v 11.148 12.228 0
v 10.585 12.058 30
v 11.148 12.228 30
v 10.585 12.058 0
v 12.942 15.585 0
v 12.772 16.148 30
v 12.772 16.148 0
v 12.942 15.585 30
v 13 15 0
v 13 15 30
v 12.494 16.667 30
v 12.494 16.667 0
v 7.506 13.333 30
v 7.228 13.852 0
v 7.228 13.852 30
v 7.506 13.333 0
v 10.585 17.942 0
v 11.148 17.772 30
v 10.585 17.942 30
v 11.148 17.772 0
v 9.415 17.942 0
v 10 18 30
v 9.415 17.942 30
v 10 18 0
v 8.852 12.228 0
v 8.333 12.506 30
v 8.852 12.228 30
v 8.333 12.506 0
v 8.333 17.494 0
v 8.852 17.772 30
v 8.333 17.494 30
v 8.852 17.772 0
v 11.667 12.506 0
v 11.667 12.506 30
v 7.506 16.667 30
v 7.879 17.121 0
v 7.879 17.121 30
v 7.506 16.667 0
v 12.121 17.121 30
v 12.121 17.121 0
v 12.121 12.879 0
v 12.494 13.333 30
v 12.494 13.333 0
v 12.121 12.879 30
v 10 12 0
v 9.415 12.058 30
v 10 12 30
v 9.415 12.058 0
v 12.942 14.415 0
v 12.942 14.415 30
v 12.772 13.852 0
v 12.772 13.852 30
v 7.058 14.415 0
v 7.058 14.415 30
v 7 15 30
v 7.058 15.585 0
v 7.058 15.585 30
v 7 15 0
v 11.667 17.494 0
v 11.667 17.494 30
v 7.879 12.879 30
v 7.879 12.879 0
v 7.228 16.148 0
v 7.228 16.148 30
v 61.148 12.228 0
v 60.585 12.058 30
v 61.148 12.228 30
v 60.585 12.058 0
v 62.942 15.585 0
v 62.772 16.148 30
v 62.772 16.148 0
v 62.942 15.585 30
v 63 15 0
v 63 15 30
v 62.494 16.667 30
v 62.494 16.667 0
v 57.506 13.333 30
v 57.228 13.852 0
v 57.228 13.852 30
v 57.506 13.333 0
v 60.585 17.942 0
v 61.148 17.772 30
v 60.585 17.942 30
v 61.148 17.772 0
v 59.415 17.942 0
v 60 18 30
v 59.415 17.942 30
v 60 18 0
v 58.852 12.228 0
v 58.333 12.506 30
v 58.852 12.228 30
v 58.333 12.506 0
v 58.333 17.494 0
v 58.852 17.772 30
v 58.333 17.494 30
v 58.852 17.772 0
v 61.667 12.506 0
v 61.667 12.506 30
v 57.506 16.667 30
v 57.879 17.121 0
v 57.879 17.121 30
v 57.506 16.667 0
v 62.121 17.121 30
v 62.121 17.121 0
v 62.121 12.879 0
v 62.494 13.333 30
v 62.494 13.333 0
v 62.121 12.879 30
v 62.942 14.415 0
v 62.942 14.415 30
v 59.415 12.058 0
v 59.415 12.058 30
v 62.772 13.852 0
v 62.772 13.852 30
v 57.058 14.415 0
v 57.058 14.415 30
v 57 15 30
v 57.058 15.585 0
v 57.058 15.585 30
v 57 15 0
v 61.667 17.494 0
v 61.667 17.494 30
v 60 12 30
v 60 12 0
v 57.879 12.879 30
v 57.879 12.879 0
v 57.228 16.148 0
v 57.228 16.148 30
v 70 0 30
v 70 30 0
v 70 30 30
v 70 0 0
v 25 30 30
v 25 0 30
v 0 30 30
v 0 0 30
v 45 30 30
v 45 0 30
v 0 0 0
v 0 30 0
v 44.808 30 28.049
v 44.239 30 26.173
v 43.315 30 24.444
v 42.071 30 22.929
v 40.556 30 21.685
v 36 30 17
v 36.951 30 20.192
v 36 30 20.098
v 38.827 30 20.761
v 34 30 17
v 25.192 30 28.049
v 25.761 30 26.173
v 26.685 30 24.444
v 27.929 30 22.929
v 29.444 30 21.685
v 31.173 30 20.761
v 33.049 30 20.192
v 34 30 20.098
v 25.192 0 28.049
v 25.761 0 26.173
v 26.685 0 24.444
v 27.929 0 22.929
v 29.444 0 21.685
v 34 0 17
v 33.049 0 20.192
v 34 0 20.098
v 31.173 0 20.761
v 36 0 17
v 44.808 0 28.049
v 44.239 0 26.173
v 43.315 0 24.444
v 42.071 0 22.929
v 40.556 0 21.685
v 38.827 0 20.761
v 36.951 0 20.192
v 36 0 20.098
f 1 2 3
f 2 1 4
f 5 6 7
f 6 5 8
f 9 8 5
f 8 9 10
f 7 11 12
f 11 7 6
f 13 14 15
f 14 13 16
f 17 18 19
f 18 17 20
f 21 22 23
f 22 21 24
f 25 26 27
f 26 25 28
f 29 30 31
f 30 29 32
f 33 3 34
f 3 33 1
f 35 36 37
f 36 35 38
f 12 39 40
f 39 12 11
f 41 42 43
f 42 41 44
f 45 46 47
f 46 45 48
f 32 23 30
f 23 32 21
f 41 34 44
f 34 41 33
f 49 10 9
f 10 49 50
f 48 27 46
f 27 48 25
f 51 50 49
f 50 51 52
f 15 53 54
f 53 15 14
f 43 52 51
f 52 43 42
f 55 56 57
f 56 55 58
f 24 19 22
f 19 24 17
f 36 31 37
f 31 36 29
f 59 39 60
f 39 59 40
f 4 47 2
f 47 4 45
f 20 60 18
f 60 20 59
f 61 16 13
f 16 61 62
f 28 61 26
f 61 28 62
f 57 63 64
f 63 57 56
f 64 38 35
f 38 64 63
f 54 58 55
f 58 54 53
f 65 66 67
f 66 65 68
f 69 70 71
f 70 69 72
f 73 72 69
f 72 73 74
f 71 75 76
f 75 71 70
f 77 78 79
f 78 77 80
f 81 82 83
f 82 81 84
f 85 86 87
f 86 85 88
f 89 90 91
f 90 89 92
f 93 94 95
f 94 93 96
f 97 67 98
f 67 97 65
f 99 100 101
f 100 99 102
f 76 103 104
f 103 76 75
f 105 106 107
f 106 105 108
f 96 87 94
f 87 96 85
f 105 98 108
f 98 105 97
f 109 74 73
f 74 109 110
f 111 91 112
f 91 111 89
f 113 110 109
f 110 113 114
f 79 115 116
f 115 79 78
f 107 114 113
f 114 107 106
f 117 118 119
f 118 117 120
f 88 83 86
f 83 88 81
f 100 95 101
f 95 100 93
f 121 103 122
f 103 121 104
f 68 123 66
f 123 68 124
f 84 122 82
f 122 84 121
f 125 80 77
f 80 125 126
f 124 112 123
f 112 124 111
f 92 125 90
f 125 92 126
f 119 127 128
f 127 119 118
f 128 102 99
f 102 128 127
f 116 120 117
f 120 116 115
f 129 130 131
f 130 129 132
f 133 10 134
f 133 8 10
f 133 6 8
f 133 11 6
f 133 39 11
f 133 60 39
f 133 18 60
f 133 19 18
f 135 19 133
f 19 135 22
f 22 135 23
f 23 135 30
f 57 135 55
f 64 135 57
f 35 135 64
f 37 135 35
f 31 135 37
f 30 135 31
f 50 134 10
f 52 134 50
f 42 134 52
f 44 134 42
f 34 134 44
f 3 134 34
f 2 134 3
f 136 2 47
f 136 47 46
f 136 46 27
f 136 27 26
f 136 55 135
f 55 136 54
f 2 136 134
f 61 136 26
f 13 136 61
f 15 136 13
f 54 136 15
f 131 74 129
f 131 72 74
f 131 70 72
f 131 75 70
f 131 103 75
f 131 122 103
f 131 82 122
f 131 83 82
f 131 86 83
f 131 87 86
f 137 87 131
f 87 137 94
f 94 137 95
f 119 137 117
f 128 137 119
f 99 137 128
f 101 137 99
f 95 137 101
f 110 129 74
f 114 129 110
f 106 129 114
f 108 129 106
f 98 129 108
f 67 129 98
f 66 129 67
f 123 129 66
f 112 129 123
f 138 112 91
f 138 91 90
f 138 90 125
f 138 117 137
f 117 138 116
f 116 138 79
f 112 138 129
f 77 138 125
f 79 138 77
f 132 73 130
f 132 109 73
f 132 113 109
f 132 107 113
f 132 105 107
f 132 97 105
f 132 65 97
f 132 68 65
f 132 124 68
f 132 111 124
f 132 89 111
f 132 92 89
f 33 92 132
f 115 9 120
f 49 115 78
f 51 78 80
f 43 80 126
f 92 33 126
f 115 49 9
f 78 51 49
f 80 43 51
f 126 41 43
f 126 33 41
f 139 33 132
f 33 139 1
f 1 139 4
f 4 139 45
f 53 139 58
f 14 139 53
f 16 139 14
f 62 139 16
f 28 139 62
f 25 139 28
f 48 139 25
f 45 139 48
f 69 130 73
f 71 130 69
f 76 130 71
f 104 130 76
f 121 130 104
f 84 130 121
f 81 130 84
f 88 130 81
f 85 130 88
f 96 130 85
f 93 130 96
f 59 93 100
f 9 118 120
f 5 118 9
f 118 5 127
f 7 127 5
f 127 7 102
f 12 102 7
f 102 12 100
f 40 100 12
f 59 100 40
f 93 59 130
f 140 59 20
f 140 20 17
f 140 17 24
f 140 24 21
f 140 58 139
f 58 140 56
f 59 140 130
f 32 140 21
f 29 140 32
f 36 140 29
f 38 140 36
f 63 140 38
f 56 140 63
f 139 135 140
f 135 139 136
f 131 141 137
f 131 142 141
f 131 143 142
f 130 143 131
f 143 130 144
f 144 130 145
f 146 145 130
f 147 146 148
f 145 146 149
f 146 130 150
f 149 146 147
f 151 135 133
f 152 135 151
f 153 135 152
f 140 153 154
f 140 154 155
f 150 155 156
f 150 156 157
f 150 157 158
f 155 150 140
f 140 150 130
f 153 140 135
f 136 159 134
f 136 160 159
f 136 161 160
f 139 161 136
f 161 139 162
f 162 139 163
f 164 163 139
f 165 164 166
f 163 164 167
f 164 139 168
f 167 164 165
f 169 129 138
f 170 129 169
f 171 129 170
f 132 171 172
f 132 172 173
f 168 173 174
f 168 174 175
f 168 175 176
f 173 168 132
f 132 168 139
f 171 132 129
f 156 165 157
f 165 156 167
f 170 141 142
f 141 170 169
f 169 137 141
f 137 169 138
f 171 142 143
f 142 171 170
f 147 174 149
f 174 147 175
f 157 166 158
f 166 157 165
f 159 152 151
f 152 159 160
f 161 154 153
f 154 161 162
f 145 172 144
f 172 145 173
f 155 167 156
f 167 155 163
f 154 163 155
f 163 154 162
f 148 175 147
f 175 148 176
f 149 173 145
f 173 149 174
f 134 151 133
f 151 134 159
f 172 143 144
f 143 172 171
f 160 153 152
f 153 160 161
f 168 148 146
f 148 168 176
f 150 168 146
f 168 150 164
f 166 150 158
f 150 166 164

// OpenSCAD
$fn = 32;

// ----------------------------------------------------------------------
// Saddle clamp: split shaft clamp
// ----------------------------------------------------------------------

// --- parameters (mm) ---
blk_l = 70;               // block length, X
blk_w = 30;               // block width, Y
blk_h = 30;               // block height
clamp_r = 10;             // shaft groove radius
hole_r = 3;               // bolt hole radius
hole_m = 10;              // bolt hole margin from the ends
saw_w = 2;                // saw kerf width

saw_depth = clamp_r + 3;  // saw kerf depth

difference() {
  cube([blk_l, blk_w, blk_h]);
  translate([blk_l / 2, -1, blk_h])
    rotate([-90, 0, 0])
      cylinder(h = blk_w + 2, r = clamp_r);
  for (sx = [0, 1])
    translate([sx ? blk_l - hole_m : hole_m, blk_w / 2, -1])
      cylinder(r = hole_r, h = blk_h + 2);
  translate([blk_l / 2 - saw_w / 2, -1, blk_h - saw_depth])
    cube([saw_w, blk_w + 2, saw_depth + 1]);
}
